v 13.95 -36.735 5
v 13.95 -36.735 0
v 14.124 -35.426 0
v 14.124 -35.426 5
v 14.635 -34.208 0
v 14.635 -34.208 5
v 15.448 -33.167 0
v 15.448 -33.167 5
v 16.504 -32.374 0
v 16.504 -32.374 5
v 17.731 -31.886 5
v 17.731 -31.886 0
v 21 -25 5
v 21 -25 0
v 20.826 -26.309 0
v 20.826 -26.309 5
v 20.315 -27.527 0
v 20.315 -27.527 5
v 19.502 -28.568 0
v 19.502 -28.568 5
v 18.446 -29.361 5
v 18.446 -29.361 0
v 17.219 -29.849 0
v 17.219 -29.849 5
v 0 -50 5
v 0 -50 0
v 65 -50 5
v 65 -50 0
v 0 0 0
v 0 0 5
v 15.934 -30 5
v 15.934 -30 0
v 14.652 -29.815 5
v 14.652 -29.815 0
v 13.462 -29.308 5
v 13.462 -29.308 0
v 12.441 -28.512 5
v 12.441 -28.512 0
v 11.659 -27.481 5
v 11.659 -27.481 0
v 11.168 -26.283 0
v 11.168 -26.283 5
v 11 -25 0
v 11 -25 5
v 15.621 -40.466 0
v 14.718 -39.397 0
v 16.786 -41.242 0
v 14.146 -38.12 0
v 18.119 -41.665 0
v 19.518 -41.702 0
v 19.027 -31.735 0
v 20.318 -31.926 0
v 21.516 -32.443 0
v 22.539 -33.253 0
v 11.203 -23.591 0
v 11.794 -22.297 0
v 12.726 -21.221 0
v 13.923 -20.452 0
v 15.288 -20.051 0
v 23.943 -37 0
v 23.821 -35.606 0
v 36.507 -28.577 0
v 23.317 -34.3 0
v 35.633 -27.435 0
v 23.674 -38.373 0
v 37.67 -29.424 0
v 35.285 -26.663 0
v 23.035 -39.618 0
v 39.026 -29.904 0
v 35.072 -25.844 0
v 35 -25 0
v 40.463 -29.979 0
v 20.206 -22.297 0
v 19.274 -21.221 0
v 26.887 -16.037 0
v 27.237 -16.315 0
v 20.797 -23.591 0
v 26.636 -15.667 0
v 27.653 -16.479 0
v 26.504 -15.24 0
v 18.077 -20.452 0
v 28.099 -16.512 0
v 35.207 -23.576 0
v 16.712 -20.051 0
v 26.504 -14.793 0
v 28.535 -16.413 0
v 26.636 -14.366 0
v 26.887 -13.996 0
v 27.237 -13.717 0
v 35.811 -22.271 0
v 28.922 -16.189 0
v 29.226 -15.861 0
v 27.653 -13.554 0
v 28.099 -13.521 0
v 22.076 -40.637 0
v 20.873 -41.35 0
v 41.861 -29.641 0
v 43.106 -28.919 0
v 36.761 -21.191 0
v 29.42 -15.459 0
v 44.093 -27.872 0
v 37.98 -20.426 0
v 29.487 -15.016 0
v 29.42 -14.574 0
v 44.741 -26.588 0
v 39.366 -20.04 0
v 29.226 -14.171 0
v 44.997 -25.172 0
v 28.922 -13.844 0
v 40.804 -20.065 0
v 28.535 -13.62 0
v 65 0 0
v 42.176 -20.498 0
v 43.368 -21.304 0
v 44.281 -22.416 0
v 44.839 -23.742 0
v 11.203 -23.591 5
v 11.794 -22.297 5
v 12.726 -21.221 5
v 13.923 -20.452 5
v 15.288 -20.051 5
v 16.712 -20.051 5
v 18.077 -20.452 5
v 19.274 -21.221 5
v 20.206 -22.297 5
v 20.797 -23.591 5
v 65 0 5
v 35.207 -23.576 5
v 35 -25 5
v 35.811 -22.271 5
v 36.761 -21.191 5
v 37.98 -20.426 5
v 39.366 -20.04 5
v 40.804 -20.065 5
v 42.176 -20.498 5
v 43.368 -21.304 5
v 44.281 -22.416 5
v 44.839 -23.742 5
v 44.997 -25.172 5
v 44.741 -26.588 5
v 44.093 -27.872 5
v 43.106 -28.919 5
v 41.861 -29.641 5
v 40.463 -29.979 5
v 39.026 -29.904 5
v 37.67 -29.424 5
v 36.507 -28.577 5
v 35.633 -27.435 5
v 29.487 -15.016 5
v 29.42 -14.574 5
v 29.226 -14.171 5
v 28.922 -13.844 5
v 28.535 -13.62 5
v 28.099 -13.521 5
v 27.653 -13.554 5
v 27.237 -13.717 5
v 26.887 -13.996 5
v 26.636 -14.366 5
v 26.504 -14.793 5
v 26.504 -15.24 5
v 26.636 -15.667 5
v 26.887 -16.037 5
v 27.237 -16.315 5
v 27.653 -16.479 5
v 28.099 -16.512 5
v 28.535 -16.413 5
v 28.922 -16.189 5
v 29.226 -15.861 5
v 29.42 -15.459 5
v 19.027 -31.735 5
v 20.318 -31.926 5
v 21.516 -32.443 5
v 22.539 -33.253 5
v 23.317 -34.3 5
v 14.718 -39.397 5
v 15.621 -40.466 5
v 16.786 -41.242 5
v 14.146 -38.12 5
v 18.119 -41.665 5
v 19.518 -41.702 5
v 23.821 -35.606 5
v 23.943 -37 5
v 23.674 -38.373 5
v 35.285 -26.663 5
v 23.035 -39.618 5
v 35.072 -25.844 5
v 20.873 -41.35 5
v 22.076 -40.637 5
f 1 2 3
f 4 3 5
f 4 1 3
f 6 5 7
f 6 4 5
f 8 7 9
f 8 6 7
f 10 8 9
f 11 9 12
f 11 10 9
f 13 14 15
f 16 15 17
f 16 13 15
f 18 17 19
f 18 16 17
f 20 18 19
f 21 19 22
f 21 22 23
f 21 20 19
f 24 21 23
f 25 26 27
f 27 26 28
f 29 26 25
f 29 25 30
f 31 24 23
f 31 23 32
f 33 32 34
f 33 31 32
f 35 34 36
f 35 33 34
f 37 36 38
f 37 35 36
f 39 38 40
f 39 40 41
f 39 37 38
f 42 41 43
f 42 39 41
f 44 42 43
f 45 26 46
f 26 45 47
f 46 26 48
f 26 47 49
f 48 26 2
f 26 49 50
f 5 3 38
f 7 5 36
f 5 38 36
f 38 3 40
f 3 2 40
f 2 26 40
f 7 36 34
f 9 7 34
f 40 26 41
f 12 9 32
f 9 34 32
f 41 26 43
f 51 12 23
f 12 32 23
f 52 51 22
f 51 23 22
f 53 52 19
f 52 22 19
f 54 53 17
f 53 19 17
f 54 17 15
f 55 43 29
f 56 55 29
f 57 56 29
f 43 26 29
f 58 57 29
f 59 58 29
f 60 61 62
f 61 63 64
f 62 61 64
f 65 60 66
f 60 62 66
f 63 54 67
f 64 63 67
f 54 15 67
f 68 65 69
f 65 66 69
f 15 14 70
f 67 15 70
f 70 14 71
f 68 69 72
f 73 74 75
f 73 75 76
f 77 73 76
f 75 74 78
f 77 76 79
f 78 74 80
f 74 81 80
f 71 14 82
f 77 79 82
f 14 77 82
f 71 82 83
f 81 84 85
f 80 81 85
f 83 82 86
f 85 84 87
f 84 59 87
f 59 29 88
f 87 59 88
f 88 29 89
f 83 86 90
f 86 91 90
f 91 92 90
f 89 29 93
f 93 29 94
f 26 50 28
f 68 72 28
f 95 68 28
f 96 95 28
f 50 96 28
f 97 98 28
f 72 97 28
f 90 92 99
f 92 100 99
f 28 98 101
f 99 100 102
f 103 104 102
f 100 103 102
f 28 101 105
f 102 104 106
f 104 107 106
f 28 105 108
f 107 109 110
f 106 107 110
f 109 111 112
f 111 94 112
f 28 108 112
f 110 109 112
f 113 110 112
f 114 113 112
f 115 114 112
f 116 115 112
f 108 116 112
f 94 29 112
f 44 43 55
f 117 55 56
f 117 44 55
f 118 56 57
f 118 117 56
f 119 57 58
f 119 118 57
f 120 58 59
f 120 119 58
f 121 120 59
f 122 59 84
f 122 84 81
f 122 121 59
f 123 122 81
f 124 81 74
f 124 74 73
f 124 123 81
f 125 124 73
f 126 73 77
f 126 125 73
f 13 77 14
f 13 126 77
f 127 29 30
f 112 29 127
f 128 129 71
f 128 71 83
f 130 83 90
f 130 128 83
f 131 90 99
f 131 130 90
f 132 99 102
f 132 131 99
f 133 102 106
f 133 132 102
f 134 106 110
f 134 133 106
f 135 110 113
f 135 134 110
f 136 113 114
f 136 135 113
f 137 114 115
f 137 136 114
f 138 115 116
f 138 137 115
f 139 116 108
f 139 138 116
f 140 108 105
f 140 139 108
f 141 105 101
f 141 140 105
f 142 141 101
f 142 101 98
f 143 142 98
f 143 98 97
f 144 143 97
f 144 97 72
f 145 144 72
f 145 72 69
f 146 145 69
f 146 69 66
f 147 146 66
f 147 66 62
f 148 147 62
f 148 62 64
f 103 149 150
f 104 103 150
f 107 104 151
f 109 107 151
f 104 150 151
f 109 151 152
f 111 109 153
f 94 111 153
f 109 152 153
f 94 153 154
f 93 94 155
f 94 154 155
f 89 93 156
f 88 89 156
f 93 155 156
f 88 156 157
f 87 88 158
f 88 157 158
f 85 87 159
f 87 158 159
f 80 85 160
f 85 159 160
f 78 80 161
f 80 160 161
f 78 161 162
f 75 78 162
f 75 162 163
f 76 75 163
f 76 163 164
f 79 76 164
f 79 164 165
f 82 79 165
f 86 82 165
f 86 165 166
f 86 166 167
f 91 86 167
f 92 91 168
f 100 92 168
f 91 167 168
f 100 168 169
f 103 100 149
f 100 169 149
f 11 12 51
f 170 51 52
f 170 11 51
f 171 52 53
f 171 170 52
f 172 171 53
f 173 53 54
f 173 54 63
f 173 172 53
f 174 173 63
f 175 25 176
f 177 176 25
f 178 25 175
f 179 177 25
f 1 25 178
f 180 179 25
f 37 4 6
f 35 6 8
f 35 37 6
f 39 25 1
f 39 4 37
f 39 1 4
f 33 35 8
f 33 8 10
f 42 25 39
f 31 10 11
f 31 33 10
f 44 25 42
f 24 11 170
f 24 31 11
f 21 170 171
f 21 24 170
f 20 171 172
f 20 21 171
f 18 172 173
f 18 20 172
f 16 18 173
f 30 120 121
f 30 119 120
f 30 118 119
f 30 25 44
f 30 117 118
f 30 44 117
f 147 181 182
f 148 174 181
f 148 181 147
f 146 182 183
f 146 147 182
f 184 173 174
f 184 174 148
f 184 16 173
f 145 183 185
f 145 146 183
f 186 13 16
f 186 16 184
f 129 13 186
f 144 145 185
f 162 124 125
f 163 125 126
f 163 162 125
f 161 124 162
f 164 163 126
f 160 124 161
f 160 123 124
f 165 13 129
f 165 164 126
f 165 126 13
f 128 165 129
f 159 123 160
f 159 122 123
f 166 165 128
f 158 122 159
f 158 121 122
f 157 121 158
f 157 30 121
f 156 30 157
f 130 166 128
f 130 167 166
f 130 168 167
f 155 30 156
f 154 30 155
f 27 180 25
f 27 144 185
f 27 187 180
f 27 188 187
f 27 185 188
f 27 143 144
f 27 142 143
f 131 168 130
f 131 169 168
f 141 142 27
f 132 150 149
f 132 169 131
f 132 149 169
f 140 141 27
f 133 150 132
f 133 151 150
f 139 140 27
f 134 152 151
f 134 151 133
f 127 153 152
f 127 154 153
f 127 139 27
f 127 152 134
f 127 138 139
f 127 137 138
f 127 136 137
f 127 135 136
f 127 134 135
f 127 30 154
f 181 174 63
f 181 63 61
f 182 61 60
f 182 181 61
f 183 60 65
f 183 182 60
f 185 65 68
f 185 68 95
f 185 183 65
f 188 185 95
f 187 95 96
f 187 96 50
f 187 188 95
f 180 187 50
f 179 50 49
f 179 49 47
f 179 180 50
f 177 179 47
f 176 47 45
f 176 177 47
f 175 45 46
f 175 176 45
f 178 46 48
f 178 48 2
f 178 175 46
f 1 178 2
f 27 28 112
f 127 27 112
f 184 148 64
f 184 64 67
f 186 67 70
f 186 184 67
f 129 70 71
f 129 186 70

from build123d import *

# Parameters (mm, degrees)
SKETCH3_W           = 65
SKETCH3_H           = 50
BOSS_EXTRUDE2_DEPTH = 5
SKETCH4_R           = 1.5
CUT_EXTRUDE2_DEPTH  = 5
CUT_EXTRUDE3_START  = -10
CUT_EXTRUDE3_DEPTH  = 10


with BuildPart() as part:
    # Sketch3 → Boss-Extrude2 (new body)
    with BuildSketch(Plane.XY):
        with Locations((32.5, -25)):
            Rectangle(SKETCH3_W, SKETCH3_H)
    extrude(amount=BOSS_EXTRUDE2_DEPTH)

    # Sketch4 → Cut-Extrude2 (cut)
    with BuildSketch(Plane.XY.offset(5)):
        with Locations((40, -25)):
            Circle(SKETCH4_R)
        with Locations((16, -25)):
            Circle(SKETCH4_R)
        with Locations((27.986991667, -15.016411928)):
            Circle(SKETCH4_R)
    extrude(amount=-CUT_EXTRUDE2_DEPTH, mode=Mode.SUBTRACT)

    # Sketch5 → Cut-Extrude3 (cut)
    with BuildSketch(Plane(origin=(0, 0, 0), x_dir=(-1, 0, 0), z_dir=(0, 0, -1)).offset(CUT_EXTRUDE3_START)):
        with BuildLine():
            ThreePointArc((-38.689834025, -25.730386964), (-41.451765987, -24.622673194), (-38.5, -25))
            Line((-38.5, -25), (-35, -25))
            ThreePointArc((-35, -25), (-44.839219957, -23.742243979), (-35.632780083, -27.434623214))
            Line((-35.632780083, -27.434623214), (-38.689834025, -25.730386964))
        make_face()
        with BuildLine():
            Line((-35, -25), (-38.5, -25))
            ThreePointArc((-38.5, -25), (-38.548234013, -25.377326806), (-38.689834025, -25.730386964))
            Line((-38.689834025, -25.730386964), (-35.632780083, -27.434623214))
            ThreePointArc((-35.632780083, -27.434623214), (-35.160780043, -26.257756021), (-35, -25))
        make_face()
        with BuildLine():
            ThreePointArc((-17.730991736, -31.885758318), (-20.933750127, -32.145250419), (-23.317219917, -34.300260679))
            Line((-23.317219917, -34.300260679), (-18.95, -36.734883894))
            Line((-18.95, -36.734883894), (-17.730991736, -31.885758318))
        make_face()
        with BuildLine():
            Line((-18.95, -36.734883894), (-23.317219917, -34.300260679))
            ThreePointArc((-23.317219917, -34.300260679), (-20.207756021, -41.574103851), (-13.95, -36.734883894))
            ThreePointArc((-13.95, -36.734883894), (-15.006965552, -33.660395426), (-17.730991736, -31.885758318))
            Line((-17.730991736, -31.885758318), (-18.95, -36.734883894))
        make_face()
        with BuildLine():
            ThreePointArc((-11, -25), (-16, -20), (-21, -25))
            Line((-21, -25), (-17.5, -25))
            ThreePointArc((-17.5, -25), (-16, -23.5), (-14.5, -25))
            ThreePointArc((-14.5, -25), (-15.07765346, -26.182910335), (-16.365702479, -26.454737673))
            Line((-16.365702479, -26.454737673), (-17.219008264, -29.849125576))
            ThreePointArc((-17.219008264, -29.849125576), (-12.925511532, -28.943034448), (-11, -25))
        make_face()
        with BuildLine():
            Line((-17.5, -25), (-21, -25))
            ThreePointArc((-21, -25), (-19.943034448, -28.074488468), (-17.219008264, -29.849125576))
            Line((-17.219008264, -29.849125576), (-16.365702479, -26.454737673))
            ThreePointArc((-16.365702479, -26.454737673), (-17.182910335, -25.92234654), (-17.5, -25))
        make_face()
    extrude(amount=CUT_EXTRUDE3_DEPTH, mode=Mode.SUBTRACT)


solid = part.part
